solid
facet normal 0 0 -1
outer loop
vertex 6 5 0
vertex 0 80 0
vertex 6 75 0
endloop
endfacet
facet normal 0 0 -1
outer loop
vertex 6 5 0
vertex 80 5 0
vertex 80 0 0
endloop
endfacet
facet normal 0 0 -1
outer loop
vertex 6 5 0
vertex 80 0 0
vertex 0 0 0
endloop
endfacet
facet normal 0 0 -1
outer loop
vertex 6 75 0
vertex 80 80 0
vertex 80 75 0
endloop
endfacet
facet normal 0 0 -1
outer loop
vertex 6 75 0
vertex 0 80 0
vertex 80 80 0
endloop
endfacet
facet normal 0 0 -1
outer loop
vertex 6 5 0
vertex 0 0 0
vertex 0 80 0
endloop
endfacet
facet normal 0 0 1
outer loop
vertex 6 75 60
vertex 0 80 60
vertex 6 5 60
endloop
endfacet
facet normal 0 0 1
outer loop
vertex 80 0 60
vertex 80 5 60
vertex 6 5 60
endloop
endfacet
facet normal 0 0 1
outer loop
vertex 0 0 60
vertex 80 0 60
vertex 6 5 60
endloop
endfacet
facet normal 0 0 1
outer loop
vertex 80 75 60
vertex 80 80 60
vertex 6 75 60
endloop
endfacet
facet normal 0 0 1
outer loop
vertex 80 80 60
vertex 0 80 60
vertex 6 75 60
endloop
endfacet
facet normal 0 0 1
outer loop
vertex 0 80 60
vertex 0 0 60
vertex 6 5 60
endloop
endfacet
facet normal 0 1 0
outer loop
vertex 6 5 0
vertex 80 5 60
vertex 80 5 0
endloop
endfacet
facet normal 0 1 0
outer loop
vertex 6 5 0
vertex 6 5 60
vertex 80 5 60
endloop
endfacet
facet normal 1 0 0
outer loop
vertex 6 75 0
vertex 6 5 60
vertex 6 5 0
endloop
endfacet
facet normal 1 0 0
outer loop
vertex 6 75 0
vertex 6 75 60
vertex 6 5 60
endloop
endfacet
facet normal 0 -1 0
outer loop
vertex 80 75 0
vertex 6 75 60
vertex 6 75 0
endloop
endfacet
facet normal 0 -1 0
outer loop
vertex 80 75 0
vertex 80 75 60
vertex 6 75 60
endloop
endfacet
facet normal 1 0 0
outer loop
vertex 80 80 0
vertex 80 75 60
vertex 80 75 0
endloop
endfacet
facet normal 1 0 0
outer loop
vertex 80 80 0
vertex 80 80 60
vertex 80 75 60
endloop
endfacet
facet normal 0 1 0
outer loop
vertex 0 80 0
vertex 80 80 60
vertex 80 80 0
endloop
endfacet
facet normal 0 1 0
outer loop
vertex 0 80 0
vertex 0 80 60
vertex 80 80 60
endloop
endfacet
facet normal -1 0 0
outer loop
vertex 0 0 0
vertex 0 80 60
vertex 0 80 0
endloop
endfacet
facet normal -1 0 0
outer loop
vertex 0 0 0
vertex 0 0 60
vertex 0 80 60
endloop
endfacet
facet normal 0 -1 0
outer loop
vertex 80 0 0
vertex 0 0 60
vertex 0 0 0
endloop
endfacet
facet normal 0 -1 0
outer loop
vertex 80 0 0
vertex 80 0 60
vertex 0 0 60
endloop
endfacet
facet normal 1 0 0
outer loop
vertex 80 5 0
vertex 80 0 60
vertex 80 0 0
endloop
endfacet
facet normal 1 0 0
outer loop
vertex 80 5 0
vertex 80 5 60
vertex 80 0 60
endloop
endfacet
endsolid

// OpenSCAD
$fn = 32;

// ----------------------------------------------------------------------
// Structural section: channel 80 x 80 mm
// ----------------------------------------------------------------------

// --- parameters (mm) ---
sec_w = 80;               // channel width, X
sec_h = 80;               // channel height, Y
flange_t = 5;             // flange thickness
web_t = 6;                // web thickness
plate_t = 60;             // cut length, Z (extrusion height)
fit_tol = 0.02;           // declared fit tolerance (prompt contract)
free_tol = 0.2;           // declared free tolerance (prompt contract)

profile = [[0, 0], [80, 0], [80, 5], [6, 5], [6, 75], [80, 75], [80, 80], [0, 80]];  // primary outline, 8 points, counter clockwise

// --- the one profile operation ---
linear_extrude(height = plate_t) polygon(points = profile);
